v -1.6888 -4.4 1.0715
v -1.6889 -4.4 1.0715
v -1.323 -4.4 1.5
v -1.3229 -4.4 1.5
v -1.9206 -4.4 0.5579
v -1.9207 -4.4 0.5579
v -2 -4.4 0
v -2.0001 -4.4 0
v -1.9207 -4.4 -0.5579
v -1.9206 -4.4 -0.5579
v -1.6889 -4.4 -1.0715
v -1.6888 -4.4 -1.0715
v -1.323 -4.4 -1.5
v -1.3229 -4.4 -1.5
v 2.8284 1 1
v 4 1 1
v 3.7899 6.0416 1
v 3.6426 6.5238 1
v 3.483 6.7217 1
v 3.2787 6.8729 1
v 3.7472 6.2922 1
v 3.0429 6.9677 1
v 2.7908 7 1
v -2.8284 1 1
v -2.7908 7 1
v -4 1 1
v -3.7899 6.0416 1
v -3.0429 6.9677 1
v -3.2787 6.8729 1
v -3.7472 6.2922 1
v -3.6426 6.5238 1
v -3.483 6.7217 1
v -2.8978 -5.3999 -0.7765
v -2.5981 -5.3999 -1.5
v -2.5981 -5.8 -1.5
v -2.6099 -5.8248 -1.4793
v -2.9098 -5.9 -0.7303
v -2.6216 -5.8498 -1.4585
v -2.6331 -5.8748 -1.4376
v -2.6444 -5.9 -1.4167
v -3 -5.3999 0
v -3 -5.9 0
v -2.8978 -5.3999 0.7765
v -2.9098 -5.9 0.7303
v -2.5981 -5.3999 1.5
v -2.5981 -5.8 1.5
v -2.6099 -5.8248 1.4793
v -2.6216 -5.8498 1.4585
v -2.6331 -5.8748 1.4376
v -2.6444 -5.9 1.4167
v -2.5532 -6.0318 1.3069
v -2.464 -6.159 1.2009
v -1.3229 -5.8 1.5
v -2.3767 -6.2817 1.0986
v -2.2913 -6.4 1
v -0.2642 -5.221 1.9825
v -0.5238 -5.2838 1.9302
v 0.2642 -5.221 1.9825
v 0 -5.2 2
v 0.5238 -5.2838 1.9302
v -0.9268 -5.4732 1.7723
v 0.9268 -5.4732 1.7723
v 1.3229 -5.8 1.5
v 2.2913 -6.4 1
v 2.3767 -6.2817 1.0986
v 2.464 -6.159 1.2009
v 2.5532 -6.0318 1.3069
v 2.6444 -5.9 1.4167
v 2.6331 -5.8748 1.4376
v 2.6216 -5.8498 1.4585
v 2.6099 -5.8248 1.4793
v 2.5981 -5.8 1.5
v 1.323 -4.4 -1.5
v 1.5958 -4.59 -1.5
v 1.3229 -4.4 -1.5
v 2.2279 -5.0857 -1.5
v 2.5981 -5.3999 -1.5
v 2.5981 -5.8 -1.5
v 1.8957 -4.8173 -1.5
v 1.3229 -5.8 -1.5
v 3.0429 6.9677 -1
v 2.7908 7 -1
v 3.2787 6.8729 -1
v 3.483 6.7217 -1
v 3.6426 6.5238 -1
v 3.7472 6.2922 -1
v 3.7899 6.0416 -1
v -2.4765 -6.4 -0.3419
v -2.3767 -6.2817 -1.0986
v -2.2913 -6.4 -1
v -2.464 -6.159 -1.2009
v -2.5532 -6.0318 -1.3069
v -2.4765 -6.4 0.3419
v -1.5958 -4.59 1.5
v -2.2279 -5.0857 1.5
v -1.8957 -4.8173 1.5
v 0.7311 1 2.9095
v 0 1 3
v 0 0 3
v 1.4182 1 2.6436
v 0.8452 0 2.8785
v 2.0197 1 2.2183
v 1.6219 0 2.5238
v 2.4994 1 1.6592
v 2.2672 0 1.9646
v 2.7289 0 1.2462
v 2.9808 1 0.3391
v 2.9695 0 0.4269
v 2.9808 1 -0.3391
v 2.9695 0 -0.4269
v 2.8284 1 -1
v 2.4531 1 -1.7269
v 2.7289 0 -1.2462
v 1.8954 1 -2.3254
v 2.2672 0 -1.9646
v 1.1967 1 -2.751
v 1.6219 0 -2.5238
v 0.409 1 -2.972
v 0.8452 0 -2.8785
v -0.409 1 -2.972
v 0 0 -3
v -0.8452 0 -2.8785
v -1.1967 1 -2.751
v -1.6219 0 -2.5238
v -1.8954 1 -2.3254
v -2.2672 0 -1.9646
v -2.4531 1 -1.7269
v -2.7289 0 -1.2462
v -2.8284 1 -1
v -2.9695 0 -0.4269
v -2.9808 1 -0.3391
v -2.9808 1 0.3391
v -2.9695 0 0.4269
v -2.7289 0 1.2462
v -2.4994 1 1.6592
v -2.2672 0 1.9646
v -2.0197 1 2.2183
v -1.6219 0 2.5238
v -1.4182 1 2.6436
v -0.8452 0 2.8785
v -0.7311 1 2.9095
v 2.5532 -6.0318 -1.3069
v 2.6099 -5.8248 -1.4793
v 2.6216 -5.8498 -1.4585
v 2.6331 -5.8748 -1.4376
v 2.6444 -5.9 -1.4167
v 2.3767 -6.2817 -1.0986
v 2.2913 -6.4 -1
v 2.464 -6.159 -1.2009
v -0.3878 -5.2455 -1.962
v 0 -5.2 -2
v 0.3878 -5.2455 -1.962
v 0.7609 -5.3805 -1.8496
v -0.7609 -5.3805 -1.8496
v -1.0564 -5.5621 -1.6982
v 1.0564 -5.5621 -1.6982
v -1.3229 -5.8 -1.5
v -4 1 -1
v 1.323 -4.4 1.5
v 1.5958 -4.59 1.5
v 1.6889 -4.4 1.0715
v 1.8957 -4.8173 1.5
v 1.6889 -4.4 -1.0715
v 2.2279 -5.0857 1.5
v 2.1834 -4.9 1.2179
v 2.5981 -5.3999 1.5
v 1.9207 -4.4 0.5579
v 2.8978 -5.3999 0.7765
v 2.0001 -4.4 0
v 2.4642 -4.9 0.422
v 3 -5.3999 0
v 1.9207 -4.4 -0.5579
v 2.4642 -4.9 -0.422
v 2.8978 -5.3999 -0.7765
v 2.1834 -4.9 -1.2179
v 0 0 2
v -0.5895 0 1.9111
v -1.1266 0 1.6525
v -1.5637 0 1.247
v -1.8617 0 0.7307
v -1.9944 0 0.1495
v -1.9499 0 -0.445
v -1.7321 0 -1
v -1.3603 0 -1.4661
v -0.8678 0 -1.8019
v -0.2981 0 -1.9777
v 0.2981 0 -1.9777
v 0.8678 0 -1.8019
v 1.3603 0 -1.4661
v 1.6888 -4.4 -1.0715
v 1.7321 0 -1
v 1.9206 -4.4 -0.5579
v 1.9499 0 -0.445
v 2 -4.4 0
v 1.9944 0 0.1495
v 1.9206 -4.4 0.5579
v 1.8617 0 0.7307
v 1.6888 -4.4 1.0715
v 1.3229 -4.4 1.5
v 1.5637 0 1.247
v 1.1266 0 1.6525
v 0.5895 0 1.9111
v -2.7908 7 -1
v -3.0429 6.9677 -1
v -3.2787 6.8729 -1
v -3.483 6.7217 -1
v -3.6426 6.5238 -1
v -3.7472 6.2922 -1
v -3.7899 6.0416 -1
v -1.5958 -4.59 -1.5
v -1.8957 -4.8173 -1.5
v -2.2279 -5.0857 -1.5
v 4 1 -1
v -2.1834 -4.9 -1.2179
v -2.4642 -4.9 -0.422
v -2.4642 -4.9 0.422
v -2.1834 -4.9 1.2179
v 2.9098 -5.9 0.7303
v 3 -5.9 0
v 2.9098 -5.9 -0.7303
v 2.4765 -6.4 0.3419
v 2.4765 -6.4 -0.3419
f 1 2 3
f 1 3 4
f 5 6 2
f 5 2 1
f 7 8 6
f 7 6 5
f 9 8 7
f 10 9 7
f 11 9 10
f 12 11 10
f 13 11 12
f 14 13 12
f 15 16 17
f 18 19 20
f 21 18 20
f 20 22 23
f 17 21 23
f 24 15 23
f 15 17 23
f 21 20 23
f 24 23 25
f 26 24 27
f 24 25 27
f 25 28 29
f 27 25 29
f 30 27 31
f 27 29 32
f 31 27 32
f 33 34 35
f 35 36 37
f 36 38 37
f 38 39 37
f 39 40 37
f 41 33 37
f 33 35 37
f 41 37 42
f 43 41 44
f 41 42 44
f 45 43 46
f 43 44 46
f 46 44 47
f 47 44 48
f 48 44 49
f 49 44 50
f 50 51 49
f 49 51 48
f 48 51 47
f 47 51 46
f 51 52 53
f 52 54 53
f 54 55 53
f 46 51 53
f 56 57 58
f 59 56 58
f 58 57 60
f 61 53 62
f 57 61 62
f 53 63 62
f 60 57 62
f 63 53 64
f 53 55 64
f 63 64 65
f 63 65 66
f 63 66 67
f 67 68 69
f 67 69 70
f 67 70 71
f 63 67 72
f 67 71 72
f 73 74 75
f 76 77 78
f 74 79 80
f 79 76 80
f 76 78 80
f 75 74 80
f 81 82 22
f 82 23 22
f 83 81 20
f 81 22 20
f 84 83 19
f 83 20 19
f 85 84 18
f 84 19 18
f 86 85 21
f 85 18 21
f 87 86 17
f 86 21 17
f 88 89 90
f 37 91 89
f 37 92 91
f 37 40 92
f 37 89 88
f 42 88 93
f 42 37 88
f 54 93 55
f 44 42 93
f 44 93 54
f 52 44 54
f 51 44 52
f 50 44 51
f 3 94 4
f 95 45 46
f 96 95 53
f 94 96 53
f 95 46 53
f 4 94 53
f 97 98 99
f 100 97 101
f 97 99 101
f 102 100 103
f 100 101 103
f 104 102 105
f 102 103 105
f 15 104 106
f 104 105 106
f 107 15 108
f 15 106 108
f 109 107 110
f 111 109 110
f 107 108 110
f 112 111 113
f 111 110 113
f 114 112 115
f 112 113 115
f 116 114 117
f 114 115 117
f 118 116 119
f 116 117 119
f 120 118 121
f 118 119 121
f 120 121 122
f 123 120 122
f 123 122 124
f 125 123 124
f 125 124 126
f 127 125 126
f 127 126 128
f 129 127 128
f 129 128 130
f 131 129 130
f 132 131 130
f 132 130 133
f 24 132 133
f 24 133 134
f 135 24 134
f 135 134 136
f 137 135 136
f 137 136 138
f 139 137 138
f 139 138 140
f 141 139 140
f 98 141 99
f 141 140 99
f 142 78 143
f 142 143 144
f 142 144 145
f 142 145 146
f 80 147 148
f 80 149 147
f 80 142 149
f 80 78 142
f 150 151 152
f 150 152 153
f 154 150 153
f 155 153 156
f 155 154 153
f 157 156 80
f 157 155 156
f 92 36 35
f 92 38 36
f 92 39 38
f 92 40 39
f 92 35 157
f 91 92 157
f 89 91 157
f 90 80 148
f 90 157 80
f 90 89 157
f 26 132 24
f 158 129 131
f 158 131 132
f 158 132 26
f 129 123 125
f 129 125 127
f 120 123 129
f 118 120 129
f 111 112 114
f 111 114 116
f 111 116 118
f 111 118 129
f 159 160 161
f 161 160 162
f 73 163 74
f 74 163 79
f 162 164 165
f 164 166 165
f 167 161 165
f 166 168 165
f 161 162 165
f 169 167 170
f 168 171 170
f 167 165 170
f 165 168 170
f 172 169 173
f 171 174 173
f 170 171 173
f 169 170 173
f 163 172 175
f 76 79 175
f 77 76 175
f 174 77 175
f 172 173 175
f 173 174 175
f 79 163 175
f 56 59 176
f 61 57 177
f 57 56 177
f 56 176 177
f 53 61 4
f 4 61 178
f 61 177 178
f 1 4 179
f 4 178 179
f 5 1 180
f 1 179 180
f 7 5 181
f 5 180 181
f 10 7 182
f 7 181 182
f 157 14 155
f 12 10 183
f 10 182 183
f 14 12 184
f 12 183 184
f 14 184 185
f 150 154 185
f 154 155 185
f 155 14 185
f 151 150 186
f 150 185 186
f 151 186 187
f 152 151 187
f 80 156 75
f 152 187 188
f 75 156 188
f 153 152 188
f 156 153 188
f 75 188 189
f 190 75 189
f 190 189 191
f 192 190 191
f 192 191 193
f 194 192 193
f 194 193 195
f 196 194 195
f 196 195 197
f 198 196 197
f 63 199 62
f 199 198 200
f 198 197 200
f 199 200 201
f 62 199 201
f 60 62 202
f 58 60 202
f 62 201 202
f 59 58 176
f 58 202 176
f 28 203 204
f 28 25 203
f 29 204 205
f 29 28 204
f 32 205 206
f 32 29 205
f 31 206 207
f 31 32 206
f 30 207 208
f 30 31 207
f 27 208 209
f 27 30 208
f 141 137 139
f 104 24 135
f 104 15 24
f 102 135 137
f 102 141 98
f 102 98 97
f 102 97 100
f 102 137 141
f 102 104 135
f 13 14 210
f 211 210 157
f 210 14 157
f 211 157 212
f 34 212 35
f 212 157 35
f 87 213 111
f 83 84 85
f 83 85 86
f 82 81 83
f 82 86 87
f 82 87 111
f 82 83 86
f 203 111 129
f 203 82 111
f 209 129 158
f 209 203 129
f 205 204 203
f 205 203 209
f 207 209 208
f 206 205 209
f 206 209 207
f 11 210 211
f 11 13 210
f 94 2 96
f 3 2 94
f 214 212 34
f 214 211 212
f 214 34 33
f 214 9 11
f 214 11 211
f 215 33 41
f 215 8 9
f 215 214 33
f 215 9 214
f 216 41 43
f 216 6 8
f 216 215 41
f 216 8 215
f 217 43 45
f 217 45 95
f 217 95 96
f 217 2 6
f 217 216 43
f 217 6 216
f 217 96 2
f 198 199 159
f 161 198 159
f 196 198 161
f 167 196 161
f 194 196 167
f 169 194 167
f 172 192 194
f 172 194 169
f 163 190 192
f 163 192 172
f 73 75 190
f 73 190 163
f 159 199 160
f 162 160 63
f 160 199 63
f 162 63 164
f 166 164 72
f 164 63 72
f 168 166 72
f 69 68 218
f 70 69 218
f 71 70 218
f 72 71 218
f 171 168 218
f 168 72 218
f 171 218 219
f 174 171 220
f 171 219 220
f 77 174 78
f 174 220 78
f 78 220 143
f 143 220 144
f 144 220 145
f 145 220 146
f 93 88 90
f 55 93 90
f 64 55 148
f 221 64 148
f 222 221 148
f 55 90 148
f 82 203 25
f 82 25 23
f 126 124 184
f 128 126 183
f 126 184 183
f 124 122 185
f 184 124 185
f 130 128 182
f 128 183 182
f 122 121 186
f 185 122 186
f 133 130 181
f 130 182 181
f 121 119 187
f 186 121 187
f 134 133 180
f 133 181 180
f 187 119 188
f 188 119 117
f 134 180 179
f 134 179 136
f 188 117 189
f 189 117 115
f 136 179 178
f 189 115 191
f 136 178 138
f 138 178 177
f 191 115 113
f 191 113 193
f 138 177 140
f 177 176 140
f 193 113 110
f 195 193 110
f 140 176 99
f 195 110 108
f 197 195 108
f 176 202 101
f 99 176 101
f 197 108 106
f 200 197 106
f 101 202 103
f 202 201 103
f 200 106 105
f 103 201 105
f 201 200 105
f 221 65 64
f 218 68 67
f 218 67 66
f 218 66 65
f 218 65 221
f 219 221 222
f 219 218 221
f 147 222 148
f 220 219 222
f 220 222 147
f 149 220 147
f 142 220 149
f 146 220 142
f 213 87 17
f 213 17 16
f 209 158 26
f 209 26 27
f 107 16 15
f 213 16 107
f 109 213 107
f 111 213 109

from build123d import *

# Parameters (mm, degrees)
SKETCH_1_R                      = 3
EXTRUDE_1_DEPTH                 = 1
EXTRUDE_2_DEPTH                 = 1
EXTRUDE_2_DEPTH_BACK            = 1
FILLET_1_R                      = 1
SKETCH_3_R                      = 2
EXTRUDE_3_DEPTH                 = 6.4
EXTRUDE_4_DEPTH                 = 2
CHAMFER_1_SIZE                  = 0.5
CHAMFER_2_SIZE                  = 1
CUT_EXTRUDE_1_REACH             = 10.602
CUT_EXTRUDE_1_DIRECTION_2_REACH = 10.602


with BuildPart() as part:
    # 草图1 → 凸台-拉伸1 (new body)
    with BuildSketch(Plane(origin=(0, 0, 0), x_dir=(1, 0, 0), z_dir=(0, 1, 0))):
        with Locations(Location((0, 0, 0), (0, 0, 270))):
            Circle(SKETCH_1_R)
    extrude(amount=EXTRUDE_1_DEPTH)

    # 草图2 → 凸台-拉伸2 (add, two sides: drawn at the far end of the back side and taken through both)
    with BuildSketch(Plane.XY.offset(-EXTRUDE_2_DEPTH_BACK)):
        Polygon((-3.75, 7), (3.75, 7), (4, 1), (-4, 1), align=None)
    extrude(amount=EXTRUDE_2_DEPTH + EXTRUDE_2_DEPTH_BACK)

    # 圆角1
    fillet_1_edges = [part.edges().sort_by_distance(p)[0] for p in [
        (-3.75, 7, 0),
        (3.75, 7, 0),
    ]]
    fillet(fillet_1_edges, radius=FILLET_1_R)

    # 草图3 → 凸台-拉伸3 (add)
    with BuildSketch(Plane(origin=(0, 0, 0), x_dir=(-1, 0, 0), z_dir=(0, -1, 0))):
        with Locations(Location((0, 0, 0), (0, 0, 270))):
            Circle(SKETCH_3_R)
    extrude(amount=EXTRUDE_3_DEPTH)

    # 草图4 → 凸台-拉伸4 (add)
    with BuildSketch(Plane(origin=(0, -6.4, 0), x_dir=(-1, 0, 0), z_dir=(0, -1, 0))):
        with BuildLine():
            Line((2.598076211, -1.5), (-2.598076211, -1.5))
            ThreePointArc((-2.598076211, -1.5), (-3, 0), (-2.598076211, 1.5))
            Line((-2.598076211, 1.5), (2.598076211, 1.5))
            ThreePointArc((2.598076211, 1.5), (3, 0), (2.598076211, -1.5))
        make_face()
    extrude(amount=-EXTRUDE_4_DEPTH)

    # 倒角1
    chamfer_1_edges = [part.edges().sort_by_distance(p)[0] for p in [
        (3, -6.4, 0),
        (-3, -6.4, 0),
    ]]
    chamfer(chamfer_1_edges, length=CHAMFER_1_SIZE)

    # 倒角2
    chamfer_2_edges = [part.edges().sort_by_distance(p)[0] for p in [
        (3, -4.4, 0),
        (-3, -4.4, 0),
    ]]
    chamfer(chamfer_2_edges, length=CHAMFER_2_SIZE - 0.0001)  # a hair under: the kernel refuses the full size

    # 草图5 → 切除-拉伸1 (cut, up to next)
    with BuildSketch(Plane(origin=(0, 0, 0), x_dir=(0, 0, -1), z_dir=(1, 0, 0)), mode=Mode.PRIVATE) as cut_extrude_1_sk1:
        Polygon((2, -5.2), (1, -6.4), (2, -6.4), align=None)
    cut_extrude_1_tool1 = extrude(cut_extrude_1_sk1.sketch, amount=-CUT_EXTRUDE_1_REACH, mode=Mode.PRIVATE) & part.part
    # 草图5 → 切除-拉伸1 (cut, up to next)
    with BuildSketch(Plane(origin=(0, 0, 0), x_dir=(0, 0, -1), z_dir=(1, 0, 0)), mode=Mode.PRIVATE) as cut_extrude_1_sk2:
        Polygon((-2, -5.2), (-2, -6.4), (-1, -6.4), align=None)
    cut_extrude_1_tool2 = extrude(cut_extrude_1_sk2.sketch, amount=-CUT_EXTRUDE_1_REACH, mode=Mode.PRIVATE) & part.part
    add(cut_extrude_1_tool1.solids().sort_by_distance((0, -6, -1.666667))[0], mode=Mode.SUBTRACT)
    add(cut_extrude_1_tool2.solids().sort_by_distance((0, -6, 1.666667))[0], mode=Mode.SUBTRACT)

    # 草图5 → 切除-拉伸1 direction 2 (cut, up to next)
    with BuildSketch(Plane(origin=(0, 0, 0), x_dir=(0, 0, -1), z_dir=(1, 0, 0)), mode=Mode.PRIVATE) as cut_extrude_1_direction_2_sk1:
        Polygon((2, -5.2), (1, -6.4), (2, -6.4), align=None)
    cut_extrude_1_direction_2_tool1 = extrude(cut_extrude_1_direction_2_sk1.sketch, amount=CUT_EXTRUDE_1_DIRECTION_2_REACH, mode=Mode.PRIVATE) & part.part
    # 草图5 → 切除-拉伸1 direction 2 (cut, up to next)
    with BuildSketch(Plane(origin=(0, 0, 0), x_dir=(0, 0, -1), z_dir=(1, 0, 0)), mode=Mode.PRIVATE) as cut_extrude_1_direction_2_sk2:
        Polygon((-2, -5.2), (-2, -6.4), (-1, -6.4), align=None)
    cut_extrude_1_direction_2_tool2 = extrude(cut_extrude_1_direction_2_sk2.sketch, amount=CUT_EXTRUDE_1_DIRECTION_2_REACH, mode=Mode.PRIVATE) & part.part
    add(cut_extrude_1_direction_2_tool1.solids().sort_by_distance((0, -6, -1.666667))[0], mode=Mode.SUBTRACT)
    add(cut_extrude_1_direction_2_tool2.solids().sort_by_distance((0, -6, 1.666667))[0], mode=Mode.SUBTRACT)


solid = part.part
